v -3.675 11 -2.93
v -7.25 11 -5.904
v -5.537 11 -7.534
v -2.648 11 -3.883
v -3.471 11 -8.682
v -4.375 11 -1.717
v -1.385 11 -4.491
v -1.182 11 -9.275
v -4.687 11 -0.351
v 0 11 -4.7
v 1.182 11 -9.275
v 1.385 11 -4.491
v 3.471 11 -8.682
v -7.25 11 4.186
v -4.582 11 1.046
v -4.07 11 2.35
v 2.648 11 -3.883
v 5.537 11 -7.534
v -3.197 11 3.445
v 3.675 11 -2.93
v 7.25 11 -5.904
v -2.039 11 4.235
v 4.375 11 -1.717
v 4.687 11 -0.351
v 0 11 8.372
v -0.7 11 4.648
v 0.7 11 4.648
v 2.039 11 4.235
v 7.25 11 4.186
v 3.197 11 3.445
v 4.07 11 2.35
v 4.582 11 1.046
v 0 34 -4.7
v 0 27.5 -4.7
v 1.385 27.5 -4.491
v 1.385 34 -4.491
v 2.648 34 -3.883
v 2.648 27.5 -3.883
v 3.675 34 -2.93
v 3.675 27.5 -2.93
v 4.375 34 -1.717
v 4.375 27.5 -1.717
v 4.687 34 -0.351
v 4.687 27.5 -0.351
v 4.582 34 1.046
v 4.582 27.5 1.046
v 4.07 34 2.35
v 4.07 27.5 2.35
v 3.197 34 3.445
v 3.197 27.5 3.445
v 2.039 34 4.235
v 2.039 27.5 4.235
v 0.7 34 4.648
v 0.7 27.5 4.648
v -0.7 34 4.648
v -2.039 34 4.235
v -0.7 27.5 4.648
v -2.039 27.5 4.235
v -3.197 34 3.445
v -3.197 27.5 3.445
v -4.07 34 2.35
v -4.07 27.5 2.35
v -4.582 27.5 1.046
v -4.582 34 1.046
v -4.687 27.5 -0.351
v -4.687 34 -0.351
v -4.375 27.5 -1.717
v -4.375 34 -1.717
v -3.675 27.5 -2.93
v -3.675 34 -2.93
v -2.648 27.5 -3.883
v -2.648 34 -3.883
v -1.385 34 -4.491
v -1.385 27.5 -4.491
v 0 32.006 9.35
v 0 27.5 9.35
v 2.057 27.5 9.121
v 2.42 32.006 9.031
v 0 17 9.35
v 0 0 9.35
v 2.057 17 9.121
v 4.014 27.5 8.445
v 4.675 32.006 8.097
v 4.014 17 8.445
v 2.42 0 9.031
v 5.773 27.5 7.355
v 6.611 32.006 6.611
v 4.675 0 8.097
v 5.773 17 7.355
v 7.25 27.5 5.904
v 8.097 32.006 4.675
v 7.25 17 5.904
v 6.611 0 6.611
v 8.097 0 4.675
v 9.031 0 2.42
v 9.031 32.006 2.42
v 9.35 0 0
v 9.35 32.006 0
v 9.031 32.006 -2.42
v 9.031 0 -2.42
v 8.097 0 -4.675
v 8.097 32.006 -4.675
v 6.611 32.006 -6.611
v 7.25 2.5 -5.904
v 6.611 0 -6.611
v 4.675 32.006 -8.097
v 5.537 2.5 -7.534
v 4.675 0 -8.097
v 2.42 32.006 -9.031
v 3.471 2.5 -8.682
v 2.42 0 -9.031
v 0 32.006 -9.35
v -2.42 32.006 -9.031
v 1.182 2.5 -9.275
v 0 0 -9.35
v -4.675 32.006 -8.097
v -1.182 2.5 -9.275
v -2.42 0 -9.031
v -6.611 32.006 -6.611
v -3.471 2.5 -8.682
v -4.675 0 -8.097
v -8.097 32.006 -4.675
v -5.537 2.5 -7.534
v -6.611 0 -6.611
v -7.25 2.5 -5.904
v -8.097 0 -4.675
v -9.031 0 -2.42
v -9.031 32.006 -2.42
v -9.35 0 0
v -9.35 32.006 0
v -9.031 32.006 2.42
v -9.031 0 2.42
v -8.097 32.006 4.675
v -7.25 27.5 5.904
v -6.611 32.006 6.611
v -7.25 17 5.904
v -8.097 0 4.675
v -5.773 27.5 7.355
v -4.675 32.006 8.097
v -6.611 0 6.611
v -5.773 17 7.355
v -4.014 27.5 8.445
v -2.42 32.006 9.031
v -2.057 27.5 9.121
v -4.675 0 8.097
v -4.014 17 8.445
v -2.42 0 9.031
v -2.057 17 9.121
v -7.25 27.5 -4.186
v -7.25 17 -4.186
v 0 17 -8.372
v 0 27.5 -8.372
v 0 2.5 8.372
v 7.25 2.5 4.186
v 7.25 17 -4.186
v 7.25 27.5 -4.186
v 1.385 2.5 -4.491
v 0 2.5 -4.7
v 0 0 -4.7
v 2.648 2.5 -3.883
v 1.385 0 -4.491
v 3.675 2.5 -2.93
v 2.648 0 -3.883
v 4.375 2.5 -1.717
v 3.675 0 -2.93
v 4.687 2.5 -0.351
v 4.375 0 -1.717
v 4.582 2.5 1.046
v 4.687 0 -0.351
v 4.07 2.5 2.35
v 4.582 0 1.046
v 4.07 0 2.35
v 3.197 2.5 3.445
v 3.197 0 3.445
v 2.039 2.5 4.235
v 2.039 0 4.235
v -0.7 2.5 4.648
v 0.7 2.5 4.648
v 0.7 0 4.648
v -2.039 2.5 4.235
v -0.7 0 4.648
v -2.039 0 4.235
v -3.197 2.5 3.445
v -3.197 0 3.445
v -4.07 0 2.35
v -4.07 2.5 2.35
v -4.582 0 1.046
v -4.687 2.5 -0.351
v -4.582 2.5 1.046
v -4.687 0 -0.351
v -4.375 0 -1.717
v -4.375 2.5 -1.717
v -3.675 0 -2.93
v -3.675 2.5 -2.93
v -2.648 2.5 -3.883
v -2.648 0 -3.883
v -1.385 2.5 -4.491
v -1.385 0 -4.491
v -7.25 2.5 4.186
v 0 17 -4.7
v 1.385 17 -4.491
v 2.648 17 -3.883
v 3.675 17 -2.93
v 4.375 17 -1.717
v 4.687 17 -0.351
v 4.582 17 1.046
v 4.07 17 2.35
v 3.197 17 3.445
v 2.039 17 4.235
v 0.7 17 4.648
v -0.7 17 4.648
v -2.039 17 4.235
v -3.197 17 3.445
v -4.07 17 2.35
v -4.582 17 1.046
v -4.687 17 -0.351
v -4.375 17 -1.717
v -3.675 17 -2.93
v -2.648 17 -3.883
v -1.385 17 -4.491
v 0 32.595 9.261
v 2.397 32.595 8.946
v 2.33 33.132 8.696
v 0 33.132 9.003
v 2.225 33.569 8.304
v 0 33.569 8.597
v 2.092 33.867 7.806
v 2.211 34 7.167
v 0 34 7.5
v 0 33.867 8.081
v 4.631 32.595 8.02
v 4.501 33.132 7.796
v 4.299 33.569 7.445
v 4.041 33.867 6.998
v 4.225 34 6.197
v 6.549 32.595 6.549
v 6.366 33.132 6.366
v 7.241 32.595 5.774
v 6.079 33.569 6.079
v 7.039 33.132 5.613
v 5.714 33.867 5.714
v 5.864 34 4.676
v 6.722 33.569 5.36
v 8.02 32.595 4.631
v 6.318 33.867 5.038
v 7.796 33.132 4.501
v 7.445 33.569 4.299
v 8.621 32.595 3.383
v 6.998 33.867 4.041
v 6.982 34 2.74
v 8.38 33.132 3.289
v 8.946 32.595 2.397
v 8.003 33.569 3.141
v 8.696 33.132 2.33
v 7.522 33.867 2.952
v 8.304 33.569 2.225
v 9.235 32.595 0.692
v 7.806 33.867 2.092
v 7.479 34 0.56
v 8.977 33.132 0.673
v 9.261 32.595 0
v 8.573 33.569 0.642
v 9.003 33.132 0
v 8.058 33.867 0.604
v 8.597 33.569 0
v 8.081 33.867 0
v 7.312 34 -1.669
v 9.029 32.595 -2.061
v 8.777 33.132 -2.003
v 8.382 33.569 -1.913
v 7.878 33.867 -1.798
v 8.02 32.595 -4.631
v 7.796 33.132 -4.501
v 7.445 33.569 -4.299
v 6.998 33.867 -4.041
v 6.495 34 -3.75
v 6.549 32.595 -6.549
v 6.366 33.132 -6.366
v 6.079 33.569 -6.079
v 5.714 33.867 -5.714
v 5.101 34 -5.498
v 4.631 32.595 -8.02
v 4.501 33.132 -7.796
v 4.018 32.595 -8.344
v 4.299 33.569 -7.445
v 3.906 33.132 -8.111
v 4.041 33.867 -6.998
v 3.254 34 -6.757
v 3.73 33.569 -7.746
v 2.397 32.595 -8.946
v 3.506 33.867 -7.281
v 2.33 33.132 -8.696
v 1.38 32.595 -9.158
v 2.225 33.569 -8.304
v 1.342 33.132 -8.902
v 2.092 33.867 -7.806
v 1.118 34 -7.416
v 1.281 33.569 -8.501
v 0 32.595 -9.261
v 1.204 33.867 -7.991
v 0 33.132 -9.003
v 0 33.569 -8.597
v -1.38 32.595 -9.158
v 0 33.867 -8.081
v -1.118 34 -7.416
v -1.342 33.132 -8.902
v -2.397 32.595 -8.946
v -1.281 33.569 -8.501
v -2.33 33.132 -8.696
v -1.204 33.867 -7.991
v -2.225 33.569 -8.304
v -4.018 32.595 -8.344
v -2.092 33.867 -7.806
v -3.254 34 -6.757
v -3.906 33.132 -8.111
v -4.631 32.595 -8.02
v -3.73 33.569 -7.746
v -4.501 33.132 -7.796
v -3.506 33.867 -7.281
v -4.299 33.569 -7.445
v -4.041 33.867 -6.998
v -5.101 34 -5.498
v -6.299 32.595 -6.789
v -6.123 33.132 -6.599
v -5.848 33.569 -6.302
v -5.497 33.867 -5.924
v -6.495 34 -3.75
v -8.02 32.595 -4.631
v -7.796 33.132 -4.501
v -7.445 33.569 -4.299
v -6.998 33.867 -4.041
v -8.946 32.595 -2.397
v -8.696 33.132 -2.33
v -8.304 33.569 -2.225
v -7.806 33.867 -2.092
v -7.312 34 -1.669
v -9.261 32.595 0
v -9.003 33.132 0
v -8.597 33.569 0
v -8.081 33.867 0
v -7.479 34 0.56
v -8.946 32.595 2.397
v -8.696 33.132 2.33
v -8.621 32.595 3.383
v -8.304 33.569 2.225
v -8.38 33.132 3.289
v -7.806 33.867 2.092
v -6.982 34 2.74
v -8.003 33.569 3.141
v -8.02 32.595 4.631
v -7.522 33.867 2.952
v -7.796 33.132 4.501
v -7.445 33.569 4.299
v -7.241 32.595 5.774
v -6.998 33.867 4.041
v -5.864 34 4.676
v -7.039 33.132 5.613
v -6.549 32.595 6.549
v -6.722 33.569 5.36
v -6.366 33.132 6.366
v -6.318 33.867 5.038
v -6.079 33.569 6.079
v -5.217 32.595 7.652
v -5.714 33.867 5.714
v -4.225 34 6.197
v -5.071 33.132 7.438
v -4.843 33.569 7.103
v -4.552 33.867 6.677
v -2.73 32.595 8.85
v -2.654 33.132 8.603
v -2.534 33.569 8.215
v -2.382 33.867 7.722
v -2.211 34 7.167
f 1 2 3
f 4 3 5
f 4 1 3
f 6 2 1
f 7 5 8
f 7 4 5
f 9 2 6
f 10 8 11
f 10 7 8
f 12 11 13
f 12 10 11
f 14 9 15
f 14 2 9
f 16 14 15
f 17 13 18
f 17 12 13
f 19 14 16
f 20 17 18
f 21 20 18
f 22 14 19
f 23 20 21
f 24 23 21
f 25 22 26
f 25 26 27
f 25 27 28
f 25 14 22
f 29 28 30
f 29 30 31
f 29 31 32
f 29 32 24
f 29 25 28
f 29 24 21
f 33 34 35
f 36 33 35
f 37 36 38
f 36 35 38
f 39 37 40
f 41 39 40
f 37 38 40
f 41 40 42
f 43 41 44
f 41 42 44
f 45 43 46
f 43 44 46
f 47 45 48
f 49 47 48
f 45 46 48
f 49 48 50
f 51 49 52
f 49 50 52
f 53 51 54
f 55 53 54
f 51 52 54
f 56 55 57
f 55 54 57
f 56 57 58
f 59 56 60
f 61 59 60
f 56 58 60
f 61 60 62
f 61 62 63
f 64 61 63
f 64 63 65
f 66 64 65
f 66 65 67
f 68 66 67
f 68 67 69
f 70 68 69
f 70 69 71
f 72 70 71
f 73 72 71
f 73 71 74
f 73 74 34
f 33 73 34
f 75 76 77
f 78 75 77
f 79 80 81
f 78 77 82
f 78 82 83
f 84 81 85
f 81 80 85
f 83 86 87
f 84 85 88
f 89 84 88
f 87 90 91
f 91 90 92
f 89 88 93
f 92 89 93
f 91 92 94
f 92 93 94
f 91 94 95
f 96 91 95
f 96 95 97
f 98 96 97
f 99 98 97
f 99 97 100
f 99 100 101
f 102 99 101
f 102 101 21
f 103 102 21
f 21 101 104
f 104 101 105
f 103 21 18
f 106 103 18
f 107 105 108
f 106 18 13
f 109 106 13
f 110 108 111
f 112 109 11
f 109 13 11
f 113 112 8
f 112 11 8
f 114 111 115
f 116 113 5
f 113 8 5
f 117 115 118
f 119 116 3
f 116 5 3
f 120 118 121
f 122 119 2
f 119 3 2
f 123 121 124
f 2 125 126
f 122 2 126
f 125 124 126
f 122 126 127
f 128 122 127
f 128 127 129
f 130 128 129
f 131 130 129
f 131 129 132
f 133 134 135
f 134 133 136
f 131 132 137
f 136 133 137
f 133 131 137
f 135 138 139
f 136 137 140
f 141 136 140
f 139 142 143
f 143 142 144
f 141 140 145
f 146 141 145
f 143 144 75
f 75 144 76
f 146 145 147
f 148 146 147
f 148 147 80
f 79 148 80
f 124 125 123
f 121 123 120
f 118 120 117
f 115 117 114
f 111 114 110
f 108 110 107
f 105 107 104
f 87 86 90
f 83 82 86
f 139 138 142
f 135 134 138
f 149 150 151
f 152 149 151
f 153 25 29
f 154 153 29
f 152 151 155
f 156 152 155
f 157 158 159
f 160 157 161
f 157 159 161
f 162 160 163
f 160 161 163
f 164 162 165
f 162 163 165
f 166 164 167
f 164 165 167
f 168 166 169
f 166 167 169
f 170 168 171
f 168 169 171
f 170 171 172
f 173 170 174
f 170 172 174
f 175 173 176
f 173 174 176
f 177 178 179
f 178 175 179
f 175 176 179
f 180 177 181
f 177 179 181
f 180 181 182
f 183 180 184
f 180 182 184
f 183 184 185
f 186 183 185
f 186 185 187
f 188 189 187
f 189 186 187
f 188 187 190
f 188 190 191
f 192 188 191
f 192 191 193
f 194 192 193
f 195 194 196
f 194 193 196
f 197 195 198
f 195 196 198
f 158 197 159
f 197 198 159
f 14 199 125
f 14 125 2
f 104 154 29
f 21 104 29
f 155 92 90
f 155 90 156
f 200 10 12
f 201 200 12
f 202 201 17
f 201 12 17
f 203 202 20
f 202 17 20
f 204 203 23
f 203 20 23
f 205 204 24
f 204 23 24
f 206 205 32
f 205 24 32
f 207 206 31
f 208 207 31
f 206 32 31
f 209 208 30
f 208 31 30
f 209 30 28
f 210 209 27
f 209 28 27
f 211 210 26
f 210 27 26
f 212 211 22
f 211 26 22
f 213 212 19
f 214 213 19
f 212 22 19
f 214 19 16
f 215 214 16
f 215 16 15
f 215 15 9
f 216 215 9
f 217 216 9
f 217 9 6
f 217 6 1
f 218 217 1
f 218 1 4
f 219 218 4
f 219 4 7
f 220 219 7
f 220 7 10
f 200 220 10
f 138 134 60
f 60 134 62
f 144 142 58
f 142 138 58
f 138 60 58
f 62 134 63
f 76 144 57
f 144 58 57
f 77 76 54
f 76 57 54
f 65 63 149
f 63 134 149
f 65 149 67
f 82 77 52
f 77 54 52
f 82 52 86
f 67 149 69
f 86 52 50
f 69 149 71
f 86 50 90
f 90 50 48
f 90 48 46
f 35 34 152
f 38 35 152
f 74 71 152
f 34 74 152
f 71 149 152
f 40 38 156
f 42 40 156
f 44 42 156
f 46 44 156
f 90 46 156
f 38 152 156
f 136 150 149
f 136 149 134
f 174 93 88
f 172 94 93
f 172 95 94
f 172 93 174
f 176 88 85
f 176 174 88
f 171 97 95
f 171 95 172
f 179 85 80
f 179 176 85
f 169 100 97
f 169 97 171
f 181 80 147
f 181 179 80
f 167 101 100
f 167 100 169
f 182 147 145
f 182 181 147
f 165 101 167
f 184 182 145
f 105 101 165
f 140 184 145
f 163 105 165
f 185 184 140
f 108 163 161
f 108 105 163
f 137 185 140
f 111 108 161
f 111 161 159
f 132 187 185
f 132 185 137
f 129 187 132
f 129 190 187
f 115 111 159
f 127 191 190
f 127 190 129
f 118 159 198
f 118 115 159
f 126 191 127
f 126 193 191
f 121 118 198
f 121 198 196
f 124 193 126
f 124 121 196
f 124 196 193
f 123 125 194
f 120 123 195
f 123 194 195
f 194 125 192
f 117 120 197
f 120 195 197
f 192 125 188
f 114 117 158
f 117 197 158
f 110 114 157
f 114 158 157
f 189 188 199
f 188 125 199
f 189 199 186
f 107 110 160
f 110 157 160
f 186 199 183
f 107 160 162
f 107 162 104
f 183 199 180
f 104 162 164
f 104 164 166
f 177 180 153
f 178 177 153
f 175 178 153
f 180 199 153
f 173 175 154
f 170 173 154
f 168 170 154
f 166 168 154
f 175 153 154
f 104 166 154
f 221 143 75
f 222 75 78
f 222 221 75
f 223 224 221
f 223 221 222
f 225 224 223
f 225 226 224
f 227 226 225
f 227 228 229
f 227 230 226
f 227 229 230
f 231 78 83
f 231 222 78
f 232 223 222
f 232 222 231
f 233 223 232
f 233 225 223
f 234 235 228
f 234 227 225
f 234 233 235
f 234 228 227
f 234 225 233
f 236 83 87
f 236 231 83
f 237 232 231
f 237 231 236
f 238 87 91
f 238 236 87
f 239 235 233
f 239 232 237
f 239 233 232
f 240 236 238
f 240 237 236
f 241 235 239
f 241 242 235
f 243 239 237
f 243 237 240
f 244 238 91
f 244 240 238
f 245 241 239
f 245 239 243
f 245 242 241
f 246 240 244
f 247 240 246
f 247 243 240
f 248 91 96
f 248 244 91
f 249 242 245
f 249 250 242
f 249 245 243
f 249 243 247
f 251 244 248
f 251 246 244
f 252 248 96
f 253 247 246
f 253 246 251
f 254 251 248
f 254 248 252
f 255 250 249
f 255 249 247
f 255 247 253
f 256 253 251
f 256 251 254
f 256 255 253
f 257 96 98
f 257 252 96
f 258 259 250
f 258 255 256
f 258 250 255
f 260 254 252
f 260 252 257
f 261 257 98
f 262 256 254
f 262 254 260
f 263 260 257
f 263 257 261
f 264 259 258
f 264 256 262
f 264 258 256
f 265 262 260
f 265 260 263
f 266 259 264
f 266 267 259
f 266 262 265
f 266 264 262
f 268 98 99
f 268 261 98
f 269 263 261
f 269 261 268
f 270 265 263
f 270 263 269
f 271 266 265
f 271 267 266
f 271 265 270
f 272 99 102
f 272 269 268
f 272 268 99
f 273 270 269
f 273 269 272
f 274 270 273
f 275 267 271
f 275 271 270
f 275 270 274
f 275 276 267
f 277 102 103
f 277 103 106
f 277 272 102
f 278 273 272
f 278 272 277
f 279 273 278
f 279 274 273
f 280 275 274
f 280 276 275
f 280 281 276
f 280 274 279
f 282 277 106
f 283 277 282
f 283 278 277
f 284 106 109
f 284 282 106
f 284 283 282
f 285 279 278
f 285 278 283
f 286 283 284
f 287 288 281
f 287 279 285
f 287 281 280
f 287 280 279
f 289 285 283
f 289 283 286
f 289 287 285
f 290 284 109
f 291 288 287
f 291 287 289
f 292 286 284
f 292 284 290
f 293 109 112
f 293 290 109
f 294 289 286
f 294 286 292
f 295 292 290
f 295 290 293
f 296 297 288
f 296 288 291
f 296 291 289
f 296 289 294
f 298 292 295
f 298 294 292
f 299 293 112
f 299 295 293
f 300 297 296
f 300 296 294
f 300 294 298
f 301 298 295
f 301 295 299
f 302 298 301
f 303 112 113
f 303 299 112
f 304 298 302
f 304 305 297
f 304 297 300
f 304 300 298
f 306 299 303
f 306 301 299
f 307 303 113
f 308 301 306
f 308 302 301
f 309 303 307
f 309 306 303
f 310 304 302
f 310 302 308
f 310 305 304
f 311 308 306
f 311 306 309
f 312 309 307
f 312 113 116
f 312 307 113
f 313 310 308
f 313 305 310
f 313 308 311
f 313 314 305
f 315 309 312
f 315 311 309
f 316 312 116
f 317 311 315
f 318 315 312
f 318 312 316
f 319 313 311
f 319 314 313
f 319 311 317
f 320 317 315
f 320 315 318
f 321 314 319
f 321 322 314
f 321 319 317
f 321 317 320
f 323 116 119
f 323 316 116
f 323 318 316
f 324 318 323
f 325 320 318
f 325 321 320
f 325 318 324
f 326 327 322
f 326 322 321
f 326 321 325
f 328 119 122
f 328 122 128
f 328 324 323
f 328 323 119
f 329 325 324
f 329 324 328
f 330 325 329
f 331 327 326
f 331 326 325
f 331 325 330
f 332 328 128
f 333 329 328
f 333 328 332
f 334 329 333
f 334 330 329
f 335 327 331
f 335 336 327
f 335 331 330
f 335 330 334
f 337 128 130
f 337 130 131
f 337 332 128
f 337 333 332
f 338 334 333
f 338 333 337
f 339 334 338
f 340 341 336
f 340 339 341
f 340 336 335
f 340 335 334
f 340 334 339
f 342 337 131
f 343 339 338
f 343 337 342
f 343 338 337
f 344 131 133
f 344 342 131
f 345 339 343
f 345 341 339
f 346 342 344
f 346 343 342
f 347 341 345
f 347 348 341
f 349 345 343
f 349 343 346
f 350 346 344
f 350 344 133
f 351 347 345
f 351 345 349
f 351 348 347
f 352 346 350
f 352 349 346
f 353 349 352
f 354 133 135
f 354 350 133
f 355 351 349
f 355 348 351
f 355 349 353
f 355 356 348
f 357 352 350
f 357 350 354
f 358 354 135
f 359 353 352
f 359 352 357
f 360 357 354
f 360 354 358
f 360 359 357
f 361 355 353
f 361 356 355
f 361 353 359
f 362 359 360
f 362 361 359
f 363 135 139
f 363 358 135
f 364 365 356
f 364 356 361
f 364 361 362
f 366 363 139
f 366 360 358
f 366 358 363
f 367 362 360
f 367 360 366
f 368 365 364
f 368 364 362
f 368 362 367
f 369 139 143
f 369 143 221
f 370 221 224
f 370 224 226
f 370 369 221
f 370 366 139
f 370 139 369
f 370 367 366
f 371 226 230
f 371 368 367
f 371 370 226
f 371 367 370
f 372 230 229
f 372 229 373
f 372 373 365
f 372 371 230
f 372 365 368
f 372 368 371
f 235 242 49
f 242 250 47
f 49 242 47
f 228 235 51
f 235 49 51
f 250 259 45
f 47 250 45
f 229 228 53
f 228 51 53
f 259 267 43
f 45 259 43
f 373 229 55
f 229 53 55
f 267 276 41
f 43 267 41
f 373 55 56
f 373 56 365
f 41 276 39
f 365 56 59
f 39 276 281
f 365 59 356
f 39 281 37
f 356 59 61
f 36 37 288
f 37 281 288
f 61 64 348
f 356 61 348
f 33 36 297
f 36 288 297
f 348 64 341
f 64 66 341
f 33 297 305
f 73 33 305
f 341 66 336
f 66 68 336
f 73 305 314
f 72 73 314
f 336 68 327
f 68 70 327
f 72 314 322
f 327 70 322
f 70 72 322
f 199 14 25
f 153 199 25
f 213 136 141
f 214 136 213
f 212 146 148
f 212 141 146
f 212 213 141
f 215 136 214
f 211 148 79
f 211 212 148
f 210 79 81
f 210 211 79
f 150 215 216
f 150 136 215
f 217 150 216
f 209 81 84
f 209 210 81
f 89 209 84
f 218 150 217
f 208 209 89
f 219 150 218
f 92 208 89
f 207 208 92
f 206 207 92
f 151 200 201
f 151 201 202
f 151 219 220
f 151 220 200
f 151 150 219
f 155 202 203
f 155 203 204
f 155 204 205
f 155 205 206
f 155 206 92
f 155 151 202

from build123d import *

# Parameters (mm, degrees)
SKETCH1_R           = 9.35
SKETCH1_R_2         = 7.5
BOSS_EXTRUDE1_DEPTH = 34
FILLET1_R           = 2
SKETCH2_R           = 7.5
BOSS_EXTRUDE2_DEPTH = 34
SKETCH3_R           = 4.7
CUT_EXTRUDE1_DEPTH  = 40
CUT_EXTRUDE2_DEPTH  = 8.5
SKETCH5_W           = 14.5
SKETCH5_H           = 8.5
CUT_EXTRUDE3_DEPTH  = 10
CUT_EXTRUDE10_DEPTH = 10.5


with BuildPart() as part:
    # Sketch1 → Boss-Extrude1 (new body)
    with BuildSketch(Plane(origin=(0, 0, 0), x_dir=(1, 0, 0), z_dir=(0, 1, 0))):
        with Locations(Location((0, 0, 0), (0, 0, 270))):
            Circle(SKETCH1_R)
        with Locations(Location((0, 0, 0), (0, 0, 270))):
            Circle(SKETCH1_R_2, mode=Mode.SUBTRACT)
    extrude(amount=BOSS_EXTRUDE1_DEPTH)

    # Fillet1
    # the kernel refuses this fillet: 2 mm, written as the material it takes off along each edge
    with BuildSketch(Plane(origin=(0, 34, 0), x_dir=(0, 0, 1), z_dir=(-1, 0, 0))) as fillet1_piece_1:
        with BuildLine():
            CenterArc((7.35, -1.994367068), FILLET1_R, 0, 85.698777695)
            Line((7.5, 0), (7.503, 0.039887341))
            ThreePointArc((7.503, 0.039887341), (8.425, 0.04), (9.35, 0.04))
            Line((9.35, 0.04), (9.39, 0))
            Line((9.39, 0), (9.39, -1.994367068))
            Line((9.39, -1.994367068), (9.35, -1.994367068))
        make_face()
    revolve(axis=Axis((0, 34, 0), (0, 1, 0)), mode=Mode.SUBTRACT)

    # Sketch2 → Boss-Extrude2 (add)
    with BuildSketch(Plane(origin=(0, 0, 0), x_dir=(-1, 0, 0), z_dir=(0, -1, 0))):
        Circle(SKETCH2_R)
    extrude(amount=-BOSS_EXTRUDE2_DEPTH)

    # Sketch3 → Cut-Extrude1 (cut)
    with BuildSketch(Plane(origin=(0, 0, 0), x_dir=(-1, 0, 0), z_dir=(0, -1, 0))):
        with Locations(Location((0, 0, 0), (0, 0, 90))):
            Circle(SKETCH3_R)
    extrude(amount=-CUT_EXTRUDE1_DEPTH, mode=Mode.SUBTRACT)

    # Sketch4 → Cut-Extrude2 (cut)
    with BuildSketch(Plane(origin=(0, 11, 0), x_dir=(1, 0, 0), z_dir=(0, 1, 0))):
        Polygon((0, -8.371578903), (7.25, -4.185789452), (7.25, 4.185789452), (0, 8.371578903), (-7.25, 4.185789452), (-7.25, -4.185789452), align=None)
    extrude(amount=-CUT_EXTRUDE2_DEPTH, mode=Mode.SUBTRACT)

    # Sketch5 → Cut-Extrude3 (cut)
    with BuildSketch(Plane.XY):
        with Locations((0, 6.75)):
            Rectangle(SKETCH5_W, SKETCH5_H)
    extrude(amount=-CUT_EXTRUDE3_DEPTH, mode=Mode.SUBTRACT)

    # Sketch6 → Cut-Extrude10 (cut)
    with BuildSketch(Plane(origin=(0, 17, 0), x_dir=(1, 0, 0), z_dir=(0, 1, 0))):
        Polygon((-7.25, 4.185789452), (-7.25, -4.185789452), (-7.25, -13.840874754), (7.25, -13.840874754), (7.25, -4.185789452), (7.25, 4.185789452), align=None)
        Polygon((7.25, 4.185789452), (-7.25, 4.185789452), (0, 8.371578903), align=None)
    extrude(amount=CUT_EXTRUDE10_DEPTH, mode=Mode.SUBTRACT)


solid = part.part
